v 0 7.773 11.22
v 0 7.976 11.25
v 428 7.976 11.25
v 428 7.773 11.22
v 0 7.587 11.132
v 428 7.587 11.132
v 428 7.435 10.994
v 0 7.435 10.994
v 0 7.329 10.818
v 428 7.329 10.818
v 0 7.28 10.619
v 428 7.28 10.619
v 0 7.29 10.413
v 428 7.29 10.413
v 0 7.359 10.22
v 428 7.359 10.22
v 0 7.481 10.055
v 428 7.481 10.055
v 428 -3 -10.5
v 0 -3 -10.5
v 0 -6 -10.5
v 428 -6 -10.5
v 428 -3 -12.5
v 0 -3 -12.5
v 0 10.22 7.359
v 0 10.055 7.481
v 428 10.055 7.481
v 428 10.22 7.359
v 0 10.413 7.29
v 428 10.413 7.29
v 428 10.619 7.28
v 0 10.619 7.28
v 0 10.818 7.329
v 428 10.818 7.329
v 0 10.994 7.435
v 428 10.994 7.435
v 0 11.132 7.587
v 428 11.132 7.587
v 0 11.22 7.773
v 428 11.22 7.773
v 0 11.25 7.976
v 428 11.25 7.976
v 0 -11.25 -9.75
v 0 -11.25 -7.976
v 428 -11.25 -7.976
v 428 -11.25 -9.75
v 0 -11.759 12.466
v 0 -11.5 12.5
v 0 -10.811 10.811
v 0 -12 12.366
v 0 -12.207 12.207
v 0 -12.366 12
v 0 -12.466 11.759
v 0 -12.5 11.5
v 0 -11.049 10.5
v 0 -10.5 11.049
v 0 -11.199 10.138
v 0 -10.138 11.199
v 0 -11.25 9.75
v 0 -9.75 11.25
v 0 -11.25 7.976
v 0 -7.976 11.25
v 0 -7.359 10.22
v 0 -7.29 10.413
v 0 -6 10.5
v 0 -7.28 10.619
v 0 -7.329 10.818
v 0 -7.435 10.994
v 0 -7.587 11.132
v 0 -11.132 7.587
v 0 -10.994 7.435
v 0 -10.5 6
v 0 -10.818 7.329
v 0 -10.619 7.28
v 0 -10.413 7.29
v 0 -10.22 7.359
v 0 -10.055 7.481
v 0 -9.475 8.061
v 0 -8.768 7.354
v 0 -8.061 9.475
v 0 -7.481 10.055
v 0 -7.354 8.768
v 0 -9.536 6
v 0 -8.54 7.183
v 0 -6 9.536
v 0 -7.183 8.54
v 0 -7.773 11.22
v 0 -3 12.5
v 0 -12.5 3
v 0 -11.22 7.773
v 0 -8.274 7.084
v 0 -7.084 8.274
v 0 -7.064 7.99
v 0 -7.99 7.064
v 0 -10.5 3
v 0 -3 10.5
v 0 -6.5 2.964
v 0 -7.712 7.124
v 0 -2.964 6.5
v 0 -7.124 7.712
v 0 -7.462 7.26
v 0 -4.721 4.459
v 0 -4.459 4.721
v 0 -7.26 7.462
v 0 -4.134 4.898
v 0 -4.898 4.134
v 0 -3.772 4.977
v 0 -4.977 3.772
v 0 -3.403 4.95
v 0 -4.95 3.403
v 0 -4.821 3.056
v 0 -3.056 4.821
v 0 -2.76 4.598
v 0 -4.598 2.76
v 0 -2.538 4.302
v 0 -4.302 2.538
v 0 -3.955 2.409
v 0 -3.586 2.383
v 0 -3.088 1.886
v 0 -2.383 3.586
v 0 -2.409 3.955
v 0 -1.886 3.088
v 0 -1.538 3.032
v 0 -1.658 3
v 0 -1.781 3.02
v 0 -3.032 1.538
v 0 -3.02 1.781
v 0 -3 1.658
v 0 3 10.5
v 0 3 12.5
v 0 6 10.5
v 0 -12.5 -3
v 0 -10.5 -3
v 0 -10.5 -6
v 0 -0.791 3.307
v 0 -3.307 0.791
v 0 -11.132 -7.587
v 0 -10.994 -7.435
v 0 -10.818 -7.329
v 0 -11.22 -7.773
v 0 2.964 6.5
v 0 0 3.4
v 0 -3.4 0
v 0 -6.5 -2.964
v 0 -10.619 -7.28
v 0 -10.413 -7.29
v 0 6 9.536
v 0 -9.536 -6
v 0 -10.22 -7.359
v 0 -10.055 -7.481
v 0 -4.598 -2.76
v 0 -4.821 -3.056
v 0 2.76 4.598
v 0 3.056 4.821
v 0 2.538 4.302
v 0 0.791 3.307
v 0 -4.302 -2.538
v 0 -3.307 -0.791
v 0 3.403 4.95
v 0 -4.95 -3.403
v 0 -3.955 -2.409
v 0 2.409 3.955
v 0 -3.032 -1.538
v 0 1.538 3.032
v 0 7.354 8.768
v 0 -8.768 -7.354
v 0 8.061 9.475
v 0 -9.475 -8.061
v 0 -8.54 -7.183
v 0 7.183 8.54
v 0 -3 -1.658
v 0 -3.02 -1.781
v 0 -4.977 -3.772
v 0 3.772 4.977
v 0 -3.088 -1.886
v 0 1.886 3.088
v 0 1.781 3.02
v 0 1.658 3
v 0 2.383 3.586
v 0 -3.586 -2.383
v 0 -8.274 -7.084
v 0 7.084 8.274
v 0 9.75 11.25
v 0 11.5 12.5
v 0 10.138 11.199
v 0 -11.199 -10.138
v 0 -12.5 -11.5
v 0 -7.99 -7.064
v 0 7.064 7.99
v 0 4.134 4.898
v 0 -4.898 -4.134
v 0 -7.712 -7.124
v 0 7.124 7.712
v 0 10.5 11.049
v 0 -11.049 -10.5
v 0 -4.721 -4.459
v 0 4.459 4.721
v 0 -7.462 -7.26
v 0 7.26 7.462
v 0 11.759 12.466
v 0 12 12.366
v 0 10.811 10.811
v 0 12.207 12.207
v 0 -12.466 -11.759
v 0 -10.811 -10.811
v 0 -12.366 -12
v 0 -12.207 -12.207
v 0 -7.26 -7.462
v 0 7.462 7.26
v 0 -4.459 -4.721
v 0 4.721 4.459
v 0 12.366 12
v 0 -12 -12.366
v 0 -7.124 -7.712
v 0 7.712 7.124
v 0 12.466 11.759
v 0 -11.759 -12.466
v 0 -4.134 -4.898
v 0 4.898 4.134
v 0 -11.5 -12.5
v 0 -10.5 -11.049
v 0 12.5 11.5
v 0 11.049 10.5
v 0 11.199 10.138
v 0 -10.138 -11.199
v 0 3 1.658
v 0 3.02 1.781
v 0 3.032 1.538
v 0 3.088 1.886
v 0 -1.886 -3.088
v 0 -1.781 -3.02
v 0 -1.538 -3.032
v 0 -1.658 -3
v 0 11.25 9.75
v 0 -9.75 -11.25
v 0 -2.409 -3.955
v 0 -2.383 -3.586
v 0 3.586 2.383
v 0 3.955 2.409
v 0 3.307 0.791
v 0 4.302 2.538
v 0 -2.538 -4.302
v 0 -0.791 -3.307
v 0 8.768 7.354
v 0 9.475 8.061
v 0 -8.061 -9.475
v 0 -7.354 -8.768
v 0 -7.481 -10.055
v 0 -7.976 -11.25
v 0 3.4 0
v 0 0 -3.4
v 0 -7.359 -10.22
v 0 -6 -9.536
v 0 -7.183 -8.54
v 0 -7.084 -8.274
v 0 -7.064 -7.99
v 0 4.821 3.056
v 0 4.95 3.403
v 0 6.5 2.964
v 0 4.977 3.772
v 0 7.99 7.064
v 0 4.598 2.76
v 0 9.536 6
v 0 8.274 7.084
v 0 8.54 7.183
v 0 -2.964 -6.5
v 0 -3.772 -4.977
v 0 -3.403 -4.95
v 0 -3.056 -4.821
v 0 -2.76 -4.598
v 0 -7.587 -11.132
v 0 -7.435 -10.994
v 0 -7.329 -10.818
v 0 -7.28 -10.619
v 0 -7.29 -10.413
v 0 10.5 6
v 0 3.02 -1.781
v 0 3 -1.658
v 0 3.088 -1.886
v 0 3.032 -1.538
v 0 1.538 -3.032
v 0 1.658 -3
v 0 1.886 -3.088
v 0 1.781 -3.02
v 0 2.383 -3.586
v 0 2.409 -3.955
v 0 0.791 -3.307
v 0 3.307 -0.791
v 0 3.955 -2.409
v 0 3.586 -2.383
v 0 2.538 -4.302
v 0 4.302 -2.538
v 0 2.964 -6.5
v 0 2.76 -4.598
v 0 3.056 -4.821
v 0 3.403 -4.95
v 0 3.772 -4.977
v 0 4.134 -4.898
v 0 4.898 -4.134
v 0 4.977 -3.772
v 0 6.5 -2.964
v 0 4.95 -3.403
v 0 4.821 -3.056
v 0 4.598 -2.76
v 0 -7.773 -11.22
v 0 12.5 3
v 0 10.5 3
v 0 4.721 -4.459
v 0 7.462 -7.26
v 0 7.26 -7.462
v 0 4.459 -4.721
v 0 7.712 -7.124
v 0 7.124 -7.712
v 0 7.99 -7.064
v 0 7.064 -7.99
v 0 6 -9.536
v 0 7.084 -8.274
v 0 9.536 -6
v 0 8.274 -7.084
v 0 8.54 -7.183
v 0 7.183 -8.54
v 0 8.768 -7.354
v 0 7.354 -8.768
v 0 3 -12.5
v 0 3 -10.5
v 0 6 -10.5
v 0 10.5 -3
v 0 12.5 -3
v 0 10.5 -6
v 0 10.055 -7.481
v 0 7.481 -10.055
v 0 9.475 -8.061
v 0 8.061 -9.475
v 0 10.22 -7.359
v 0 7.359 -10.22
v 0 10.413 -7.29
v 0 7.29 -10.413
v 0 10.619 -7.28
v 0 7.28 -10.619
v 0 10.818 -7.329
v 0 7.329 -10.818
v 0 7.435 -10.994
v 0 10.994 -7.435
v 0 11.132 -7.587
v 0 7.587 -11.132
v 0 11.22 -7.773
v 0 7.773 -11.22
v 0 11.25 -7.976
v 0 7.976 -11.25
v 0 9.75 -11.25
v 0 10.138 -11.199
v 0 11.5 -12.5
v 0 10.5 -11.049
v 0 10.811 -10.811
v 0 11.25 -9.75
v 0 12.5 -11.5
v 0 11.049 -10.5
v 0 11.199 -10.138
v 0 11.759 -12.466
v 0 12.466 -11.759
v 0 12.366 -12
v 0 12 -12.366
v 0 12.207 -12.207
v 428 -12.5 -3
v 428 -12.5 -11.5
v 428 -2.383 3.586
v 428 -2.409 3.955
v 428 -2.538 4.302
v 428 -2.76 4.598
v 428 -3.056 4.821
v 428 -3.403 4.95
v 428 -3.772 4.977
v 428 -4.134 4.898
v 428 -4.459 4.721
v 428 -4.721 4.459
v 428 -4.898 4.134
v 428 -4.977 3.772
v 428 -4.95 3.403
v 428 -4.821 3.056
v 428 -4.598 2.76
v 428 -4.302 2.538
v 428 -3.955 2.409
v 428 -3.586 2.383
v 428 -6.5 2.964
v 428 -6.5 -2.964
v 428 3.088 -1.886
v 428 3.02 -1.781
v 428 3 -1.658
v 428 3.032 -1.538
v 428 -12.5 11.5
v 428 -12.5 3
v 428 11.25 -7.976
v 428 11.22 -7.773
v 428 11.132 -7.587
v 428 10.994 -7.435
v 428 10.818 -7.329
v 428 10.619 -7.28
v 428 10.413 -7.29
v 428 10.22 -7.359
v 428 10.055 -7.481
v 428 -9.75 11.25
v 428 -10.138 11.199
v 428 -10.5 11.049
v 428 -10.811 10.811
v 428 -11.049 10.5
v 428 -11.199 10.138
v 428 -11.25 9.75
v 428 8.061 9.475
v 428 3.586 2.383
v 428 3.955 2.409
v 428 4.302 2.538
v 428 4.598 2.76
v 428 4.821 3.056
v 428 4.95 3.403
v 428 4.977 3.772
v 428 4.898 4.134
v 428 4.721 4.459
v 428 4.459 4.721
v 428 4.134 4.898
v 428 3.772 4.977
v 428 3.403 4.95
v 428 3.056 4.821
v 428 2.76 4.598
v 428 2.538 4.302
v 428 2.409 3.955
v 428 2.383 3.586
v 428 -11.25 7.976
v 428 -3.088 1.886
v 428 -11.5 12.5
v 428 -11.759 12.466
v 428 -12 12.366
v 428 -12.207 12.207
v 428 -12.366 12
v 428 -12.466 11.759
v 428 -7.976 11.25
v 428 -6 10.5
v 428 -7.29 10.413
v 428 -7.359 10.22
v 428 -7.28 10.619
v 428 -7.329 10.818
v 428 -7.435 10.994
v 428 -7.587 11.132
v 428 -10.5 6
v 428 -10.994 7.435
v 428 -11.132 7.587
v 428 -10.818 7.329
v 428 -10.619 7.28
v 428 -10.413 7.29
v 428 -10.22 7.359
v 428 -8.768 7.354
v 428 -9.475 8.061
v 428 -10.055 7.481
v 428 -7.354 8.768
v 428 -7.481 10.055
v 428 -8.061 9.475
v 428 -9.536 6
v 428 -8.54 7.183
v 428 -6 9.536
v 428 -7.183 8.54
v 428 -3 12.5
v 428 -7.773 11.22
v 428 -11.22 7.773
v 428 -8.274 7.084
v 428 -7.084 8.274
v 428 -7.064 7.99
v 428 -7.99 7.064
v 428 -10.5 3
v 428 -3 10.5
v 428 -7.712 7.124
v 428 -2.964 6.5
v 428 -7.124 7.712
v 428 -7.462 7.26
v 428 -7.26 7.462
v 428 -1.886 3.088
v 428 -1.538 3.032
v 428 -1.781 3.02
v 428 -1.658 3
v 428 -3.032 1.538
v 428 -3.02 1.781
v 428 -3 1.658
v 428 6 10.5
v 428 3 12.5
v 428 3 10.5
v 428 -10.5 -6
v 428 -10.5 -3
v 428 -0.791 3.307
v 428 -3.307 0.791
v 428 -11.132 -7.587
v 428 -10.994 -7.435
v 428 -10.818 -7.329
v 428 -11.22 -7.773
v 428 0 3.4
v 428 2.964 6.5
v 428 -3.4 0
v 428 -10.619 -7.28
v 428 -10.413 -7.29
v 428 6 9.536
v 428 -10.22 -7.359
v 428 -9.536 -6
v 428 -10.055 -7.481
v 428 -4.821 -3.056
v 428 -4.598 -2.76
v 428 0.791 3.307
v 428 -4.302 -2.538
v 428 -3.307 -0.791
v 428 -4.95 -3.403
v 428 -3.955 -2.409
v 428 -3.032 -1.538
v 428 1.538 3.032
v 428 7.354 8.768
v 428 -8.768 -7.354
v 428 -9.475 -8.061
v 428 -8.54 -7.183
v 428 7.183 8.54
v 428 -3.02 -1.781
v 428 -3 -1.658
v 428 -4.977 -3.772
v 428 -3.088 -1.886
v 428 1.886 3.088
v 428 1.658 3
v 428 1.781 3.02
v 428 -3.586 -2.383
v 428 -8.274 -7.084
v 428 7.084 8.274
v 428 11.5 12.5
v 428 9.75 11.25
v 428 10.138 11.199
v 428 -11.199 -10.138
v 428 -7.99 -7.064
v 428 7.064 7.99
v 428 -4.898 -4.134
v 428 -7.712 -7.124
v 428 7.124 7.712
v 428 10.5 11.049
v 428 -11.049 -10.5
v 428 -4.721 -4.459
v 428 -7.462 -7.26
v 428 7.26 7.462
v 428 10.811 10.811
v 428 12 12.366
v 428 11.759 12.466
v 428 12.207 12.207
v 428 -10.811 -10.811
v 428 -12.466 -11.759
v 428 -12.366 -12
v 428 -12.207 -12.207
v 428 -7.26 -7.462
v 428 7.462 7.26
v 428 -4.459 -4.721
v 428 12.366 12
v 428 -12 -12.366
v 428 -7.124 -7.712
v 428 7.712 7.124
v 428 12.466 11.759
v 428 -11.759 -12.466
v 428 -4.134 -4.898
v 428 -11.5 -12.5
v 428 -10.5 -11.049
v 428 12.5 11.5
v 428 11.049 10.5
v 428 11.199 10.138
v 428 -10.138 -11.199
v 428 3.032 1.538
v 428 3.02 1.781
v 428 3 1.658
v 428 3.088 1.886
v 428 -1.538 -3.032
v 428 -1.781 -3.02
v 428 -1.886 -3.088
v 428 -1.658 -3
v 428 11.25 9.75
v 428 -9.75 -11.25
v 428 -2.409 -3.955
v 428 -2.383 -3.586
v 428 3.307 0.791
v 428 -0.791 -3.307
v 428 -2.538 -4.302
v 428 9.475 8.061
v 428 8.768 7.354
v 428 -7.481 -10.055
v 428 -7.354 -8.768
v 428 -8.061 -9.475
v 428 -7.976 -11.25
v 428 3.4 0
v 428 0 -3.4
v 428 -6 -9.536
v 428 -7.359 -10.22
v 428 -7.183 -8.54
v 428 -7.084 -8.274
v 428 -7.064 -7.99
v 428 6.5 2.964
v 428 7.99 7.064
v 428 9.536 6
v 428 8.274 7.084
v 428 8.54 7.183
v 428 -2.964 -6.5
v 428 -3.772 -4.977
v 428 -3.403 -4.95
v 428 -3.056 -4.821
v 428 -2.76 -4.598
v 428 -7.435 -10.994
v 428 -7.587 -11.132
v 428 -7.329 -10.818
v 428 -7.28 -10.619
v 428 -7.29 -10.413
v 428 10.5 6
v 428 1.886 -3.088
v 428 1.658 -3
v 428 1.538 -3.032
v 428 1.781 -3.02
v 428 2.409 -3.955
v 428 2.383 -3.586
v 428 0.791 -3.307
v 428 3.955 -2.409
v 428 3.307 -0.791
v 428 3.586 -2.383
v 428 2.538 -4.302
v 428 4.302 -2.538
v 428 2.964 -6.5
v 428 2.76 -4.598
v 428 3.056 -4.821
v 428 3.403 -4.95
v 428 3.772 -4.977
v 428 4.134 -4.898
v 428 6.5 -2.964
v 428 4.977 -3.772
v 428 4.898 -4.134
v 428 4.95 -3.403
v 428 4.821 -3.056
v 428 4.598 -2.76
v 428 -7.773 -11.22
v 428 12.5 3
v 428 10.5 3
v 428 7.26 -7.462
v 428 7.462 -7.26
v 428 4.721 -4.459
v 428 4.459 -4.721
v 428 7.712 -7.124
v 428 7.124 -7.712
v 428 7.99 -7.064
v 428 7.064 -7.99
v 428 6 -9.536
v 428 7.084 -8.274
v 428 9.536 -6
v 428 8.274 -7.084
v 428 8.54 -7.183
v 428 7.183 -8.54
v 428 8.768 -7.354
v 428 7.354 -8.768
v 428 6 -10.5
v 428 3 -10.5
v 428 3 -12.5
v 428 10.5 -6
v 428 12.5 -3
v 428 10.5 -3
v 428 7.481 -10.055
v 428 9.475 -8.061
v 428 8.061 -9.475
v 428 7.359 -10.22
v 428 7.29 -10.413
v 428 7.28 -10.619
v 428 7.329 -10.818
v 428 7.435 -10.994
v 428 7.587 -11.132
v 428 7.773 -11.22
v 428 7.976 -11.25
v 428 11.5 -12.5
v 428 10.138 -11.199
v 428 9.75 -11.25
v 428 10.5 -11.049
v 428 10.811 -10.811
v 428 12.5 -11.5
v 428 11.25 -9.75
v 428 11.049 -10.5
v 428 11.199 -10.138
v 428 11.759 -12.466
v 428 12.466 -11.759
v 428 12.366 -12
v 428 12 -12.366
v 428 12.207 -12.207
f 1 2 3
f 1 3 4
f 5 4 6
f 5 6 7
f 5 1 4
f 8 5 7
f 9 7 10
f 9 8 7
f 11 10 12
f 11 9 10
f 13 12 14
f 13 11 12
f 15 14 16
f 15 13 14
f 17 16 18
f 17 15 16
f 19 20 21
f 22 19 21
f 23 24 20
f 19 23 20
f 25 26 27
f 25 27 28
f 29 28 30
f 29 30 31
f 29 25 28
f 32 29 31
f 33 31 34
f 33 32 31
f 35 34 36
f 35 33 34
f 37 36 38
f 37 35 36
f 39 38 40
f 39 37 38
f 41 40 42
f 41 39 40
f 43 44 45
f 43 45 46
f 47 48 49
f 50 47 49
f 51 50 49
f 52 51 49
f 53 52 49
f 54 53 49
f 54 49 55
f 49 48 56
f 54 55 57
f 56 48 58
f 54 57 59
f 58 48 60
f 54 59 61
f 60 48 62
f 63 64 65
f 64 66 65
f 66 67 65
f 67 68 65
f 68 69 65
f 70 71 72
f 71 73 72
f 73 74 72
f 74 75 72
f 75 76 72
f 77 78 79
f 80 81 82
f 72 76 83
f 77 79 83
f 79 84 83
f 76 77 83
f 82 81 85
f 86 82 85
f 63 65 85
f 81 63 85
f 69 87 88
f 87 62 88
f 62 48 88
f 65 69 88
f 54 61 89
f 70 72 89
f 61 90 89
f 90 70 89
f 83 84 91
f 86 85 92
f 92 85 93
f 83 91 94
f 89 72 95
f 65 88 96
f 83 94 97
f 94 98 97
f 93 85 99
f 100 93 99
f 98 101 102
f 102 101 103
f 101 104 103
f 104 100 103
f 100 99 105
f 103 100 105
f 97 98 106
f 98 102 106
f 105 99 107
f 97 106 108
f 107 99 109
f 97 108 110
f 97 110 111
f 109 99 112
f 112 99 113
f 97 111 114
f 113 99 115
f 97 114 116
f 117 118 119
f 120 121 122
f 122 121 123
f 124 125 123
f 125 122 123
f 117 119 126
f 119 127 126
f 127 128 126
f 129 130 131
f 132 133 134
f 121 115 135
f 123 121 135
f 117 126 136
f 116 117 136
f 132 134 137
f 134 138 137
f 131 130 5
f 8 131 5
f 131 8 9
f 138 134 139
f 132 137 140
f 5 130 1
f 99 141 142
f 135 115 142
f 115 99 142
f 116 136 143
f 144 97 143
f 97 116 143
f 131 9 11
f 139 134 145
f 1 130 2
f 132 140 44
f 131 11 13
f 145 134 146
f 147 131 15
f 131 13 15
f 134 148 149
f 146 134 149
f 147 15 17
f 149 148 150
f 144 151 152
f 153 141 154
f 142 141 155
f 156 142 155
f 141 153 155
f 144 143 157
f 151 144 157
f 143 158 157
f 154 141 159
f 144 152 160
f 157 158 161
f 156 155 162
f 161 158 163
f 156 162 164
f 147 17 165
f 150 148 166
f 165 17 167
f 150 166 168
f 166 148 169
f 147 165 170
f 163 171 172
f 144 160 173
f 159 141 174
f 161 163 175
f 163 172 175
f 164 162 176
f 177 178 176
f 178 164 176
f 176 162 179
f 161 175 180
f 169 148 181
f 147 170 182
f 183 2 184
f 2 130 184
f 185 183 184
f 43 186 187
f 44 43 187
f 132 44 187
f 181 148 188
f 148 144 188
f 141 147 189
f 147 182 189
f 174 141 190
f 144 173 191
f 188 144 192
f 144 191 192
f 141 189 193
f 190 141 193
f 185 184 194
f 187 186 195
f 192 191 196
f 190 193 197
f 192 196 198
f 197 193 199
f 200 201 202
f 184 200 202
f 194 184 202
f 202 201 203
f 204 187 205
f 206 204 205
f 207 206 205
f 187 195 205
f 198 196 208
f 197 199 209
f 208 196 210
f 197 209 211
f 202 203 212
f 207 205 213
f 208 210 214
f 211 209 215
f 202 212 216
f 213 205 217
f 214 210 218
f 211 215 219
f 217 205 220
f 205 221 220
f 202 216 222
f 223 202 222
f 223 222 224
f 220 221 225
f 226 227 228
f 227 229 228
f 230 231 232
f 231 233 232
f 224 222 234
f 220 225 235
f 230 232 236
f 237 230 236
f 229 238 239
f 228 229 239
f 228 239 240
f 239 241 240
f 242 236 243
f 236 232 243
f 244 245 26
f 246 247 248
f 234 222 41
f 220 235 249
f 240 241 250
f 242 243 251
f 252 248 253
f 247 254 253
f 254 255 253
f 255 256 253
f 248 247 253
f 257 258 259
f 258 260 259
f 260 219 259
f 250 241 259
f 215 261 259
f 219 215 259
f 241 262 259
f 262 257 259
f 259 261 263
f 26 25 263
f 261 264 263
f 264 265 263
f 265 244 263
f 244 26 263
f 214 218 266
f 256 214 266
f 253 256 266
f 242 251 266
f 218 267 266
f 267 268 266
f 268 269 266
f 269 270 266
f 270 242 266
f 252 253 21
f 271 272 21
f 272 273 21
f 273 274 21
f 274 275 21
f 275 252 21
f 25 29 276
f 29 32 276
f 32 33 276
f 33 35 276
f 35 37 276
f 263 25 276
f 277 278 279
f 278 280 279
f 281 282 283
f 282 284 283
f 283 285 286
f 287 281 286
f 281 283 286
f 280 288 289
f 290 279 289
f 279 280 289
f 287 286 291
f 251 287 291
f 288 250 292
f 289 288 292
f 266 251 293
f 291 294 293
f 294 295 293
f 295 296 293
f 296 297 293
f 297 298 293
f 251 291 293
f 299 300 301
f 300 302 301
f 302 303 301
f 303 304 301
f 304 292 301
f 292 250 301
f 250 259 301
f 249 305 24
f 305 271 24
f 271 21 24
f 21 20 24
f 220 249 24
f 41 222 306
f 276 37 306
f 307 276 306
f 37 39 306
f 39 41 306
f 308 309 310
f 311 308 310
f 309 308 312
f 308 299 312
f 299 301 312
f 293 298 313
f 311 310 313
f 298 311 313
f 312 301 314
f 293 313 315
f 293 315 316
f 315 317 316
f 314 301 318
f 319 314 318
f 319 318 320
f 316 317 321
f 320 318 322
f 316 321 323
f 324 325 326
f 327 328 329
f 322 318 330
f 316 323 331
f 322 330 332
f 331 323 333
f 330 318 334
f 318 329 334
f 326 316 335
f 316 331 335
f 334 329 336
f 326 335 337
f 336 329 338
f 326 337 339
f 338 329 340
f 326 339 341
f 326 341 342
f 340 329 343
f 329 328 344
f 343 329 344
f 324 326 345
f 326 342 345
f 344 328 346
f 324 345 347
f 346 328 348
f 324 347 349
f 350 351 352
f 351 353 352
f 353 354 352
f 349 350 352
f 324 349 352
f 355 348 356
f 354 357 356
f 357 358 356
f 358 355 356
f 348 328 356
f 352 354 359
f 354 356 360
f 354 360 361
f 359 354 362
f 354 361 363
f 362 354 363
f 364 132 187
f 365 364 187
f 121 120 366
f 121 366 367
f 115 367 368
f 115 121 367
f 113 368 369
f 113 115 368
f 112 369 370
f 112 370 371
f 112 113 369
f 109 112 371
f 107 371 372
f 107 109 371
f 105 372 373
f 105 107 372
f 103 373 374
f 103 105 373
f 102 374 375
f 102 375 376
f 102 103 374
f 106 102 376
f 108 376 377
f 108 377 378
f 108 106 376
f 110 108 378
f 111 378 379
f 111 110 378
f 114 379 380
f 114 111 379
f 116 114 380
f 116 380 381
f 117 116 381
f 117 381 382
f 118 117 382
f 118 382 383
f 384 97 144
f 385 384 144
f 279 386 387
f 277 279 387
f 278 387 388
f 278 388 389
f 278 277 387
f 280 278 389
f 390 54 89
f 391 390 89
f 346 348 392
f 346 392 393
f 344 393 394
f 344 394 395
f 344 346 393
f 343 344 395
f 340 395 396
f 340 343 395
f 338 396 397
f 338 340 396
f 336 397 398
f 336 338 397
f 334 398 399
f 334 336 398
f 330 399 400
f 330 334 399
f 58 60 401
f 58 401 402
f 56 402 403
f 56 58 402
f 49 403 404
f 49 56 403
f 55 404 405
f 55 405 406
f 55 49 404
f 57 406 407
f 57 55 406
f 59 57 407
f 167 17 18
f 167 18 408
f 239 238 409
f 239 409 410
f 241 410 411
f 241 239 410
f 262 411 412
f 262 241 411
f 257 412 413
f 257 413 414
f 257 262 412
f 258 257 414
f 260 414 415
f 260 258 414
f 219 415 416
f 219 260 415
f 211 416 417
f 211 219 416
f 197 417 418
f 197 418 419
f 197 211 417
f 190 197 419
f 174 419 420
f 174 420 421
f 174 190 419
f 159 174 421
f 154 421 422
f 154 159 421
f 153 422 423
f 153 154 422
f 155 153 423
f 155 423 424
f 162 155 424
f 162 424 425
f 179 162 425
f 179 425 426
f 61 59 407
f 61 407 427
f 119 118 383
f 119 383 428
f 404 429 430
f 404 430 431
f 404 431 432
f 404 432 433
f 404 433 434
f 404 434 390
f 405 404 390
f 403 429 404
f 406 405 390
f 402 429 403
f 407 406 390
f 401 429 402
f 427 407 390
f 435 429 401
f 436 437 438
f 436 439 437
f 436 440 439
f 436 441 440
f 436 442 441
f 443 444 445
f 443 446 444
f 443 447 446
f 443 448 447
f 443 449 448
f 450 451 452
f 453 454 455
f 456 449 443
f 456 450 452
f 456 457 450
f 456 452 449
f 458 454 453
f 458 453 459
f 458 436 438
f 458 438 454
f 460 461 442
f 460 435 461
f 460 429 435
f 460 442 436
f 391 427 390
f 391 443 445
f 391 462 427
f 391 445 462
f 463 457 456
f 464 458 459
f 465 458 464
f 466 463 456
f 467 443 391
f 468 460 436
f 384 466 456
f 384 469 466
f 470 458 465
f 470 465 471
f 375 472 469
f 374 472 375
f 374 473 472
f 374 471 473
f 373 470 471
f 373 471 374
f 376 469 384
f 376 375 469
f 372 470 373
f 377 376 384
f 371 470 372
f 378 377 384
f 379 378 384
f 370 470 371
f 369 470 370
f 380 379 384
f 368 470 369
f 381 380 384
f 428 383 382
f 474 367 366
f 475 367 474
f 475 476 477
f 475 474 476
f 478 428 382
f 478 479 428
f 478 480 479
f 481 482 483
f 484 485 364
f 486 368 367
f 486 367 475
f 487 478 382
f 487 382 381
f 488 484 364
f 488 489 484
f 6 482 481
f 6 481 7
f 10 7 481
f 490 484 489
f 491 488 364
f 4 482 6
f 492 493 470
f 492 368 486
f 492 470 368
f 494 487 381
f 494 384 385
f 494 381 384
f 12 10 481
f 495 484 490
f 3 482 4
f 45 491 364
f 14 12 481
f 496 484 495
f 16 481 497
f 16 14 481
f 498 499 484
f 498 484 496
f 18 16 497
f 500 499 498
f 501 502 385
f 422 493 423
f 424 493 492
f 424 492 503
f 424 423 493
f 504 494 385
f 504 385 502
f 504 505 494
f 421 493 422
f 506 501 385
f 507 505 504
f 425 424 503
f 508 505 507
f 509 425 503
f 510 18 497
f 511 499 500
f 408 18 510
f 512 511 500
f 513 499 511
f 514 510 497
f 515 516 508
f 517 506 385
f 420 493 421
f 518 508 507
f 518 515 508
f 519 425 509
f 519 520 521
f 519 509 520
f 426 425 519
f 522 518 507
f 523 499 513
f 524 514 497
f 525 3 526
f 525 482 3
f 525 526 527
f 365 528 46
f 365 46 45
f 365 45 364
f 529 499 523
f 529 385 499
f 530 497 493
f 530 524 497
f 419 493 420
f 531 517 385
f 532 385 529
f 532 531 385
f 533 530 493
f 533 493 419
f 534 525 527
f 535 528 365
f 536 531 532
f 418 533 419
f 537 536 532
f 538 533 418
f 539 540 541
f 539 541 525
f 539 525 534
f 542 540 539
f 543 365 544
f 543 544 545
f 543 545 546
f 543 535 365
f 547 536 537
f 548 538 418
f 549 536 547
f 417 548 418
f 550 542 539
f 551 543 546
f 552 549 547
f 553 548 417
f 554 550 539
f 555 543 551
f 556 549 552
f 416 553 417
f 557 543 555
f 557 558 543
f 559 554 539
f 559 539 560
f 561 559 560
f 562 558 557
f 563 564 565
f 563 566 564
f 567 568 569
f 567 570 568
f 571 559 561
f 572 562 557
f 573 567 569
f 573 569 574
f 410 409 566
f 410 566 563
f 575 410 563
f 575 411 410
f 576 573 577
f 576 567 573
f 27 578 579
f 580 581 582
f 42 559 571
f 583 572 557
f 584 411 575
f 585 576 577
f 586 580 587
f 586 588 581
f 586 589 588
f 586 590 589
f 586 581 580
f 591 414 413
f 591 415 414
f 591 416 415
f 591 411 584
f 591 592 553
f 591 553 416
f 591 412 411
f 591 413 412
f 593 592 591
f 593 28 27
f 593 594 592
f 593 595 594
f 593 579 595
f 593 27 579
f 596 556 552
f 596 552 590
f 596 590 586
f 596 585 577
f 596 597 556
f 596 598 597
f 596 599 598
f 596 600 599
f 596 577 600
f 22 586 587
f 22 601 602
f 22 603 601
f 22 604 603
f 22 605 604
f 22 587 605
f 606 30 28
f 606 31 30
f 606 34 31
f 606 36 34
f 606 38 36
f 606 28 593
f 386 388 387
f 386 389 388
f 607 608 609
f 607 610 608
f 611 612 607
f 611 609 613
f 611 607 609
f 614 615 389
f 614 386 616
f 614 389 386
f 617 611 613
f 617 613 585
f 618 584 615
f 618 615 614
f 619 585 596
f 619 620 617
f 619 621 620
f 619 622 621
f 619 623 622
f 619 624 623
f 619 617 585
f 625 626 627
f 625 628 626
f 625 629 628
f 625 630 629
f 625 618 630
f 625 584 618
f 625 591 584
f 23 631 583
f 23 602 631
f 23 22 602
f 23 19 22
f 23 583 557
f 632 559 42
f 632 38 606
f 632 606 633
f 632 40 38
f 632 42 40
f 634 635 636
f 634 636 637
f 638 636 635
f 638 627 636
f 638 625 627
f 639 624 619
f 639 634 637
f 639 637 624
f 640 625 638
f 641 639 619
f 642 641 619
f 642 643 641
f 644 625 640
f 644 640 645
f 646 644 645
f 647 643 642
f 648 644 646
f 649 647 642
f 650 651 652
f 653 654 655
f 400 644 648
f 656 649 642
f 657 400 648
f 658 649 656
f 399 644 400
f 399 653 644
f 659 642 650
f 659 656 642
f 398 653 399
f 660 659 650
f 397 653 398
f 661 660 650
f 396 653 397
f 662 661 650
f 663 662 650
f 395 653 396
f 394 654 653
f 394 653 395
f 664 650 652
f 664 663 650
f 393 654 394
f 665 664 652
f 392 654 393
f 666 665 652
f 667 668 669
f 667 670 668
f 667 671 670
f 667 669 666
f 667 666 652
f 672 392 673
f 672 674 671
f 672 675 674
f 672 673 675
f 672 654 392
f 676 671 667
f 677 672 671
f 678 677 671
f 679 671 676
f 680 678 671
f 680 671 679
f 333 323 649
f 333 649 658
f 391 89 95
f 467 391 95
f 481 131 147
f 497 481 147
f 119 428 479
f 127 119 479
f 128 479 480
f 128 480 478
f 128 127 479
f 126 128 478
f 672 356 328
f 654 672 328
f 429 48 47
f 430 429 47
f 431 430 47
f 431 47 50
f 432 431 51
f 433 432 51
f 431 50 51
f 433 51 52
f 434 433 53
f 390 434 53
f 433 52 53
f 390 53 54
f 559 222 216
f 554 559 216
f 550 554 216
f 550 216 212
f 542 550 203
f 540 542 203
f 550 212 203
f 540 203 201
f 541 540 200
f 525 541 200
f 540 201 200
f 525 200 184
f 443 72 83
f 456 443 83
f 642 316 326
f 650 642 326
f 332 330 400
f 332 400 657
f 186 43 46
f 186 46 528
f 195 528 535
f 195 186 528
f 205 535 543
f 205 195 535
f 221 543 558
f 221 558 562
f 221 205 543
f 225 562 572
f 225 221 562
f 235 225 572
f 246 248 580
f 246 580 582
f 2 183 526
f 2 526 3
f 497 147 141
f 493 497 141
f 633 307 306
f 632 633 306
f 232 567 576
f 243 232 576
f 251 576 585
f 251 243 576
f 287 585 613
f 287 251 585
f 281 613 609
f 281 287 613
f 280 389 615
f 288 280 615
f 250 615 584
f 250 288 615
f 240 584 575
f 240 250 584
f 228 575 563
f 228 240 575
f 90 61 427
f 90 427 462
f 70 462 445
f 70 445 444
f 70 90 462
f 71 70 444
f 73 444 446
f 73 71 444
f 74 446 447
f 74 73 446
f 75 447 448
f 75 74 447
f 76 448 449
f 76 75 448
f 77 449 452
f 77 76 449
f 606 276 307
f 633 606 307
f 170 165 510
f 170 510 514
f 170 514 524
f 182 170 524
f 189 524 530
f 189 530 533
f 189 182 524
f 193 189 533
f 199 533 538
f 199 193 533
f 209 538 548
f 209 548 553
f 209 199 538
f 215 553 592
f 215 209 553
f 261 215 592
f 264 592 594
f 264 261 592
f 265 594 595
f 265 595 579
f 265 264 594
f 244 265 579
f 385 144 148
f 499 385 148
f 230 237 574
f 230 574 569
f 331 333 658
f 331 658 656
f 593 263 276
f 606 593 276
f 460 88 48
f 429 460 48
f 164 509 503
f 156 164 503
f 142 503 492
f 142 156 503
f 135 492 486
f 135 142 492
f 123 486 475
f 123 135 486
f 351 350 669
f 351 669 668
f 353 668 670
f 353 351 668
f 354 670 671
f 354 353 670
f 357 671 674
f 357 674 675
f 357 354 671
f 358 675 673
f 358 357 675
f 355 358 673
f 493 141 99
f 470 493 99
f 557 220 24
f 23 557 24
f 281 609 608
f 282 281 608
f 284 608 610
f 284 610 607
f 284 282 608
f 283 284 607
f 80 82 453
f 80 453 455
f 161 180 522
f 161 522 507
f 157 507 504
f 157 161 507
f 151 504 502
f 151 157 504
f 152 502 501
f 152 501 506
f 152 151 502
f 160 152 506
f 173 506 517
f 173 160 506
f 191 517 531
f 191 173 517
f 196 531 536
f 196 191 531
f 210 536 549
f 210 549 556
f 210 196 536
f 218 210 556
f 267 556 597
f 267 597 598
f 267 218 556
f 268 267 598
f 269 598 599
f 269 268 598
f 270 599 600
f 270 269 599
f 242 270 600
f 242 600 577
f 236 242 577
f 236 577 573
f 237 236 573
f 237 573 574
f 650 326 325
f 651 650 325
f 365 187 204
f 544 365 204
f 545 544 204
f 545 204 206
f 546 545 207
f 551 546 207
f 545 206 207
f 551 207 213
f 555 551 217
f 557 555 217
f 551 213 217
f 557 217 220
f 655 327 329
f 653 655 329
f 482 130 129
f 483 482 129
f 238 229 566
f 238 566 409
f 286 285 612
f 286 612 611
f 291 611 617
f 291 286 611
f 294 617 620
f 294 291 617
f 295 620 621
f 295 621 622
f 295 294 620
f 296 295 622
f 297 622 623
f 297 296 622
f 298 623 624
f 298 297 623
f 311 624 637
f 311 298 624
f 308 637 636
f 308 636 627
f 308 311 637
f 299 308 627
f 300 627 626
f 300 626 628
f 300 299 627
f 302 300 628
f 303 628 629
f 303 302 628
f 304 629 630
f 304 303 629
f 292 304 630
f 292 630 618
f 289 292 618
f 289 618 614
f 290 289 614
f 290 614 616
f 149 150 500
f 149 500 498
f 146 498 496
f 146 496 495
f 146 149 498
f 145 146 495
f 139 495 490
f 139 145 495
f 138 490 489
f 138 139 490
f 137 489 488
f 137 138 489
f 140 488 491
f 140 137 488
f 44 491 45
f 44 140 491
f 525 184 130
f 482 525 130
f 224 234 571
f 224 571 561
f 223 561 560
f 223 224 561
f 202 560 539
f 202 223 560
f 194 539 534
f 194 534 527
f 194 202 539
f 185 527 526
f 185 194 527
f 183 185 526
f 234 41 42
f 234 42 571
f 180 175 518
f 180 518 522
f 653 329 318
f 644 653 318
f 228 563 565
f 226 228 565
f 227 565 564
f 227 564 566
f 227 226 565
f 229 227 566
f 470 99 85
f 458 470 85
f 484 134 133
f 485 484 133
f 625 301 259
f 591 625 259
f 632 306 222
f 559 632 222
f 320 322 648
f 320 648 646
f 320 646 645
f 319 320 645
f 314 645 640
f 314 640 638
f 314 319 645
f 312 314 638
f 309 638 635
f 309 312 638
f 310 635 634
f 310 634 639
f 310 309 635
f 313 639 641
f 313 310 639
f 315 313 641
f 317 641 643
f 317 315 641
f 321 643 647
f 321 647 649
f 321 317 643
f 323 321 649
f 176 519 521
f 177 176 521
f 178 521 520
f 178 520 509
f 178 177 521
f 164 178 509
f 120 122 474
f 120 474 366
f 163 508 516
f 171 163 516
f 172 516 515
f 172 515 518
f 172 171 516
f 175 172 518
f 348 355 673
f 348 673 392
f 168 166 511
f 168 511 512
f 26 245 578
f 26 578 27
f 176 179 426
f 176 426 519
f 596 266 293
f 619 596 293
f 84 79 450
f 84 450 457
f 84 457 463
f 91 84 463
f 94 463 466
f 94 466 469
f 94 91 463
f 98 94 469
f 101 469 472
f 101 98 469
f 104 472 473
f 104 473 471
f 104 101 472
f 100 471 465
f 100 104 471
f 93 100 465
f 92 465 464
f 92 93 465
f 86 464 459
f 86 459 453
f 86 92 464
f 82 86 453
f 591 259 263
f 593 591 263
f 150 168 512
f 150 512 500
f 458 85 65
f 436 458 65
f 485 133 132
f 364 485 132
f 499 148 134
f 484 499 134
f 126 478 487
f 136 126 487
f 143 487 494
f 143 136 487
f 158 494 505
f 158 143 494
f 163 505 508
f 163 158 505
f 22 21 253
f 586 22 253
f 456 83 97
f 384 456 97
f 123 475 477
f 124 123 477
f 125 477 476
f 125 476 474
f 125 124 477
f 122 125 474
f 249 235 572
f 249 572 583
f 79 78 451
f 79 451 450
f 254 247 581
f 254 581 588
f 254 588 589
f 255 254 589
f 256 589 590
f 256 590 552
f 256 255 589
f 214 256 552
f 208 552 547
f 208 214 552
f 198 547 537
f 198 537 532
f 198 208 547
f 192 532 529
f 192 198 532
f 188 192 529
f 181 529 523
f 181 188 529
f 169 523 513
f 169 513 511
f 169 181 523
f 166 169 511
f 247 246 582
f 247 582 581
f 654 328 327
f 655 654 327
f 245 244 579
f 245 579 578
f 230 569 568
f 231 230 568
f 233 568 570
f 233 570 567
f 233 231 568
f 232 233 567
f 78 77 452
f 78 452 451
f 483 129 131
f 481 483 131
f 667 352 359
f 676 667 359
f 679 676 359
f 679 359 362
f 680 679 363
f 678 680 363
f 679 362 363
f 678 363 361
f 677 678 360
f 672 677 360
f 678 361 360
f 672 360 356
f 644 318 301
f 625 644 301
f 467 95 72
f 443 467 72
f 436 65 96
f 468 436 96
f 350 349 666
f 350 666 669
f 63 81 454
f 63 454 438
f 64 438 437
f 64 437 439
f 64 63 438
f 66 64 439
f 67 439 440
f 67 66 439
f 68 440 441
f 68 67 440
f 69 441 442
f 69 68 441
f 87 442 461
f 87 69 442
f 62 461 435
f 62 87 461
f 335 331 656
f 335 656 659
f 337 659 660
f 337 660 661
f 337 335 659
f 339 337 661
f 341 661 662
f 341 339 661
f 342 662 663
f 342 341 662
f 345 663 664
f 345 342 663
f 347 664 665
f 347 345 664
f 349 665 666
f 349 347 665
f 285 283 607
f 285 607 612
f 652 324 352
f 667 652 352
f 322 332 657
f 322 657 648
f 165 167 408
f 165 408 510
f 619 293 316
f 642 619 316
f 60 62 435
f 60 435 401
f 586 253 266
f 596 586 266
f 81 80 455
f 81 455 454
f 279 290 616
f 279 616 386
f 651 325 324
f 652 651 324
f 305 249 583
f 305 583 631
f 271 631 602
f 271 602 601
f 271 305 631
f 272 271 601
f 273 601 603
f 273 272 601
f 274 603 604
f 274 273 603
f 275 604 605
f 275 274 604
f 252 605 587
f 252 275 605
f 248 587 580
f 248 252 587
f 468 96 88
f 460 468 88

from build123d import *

# Parameters (mm, degrees)
BOSS_EXTRUDE1_DEPTH = 428


with BuildPart() as part:
    # Sketch1 → Boss-Extrude1 (new body)
    with BuildSketch(Plane(origin=(0, 0, 0), x_dir=(0, 0, -1), z_dir=(1, 0, 0))):
        with BuildLine():
            Line((-12.5, 11.5), (-12.5, 3))
            Line((-12.5, 3), (-10.5, 3))
            Line((-10.5, 3), (-10.5, 6))
            Line((-10.5, 6), (-9.535533906, 6))
            Line((-9.535533906, 6), (-6.5, 2.964466094))
            Line((-6.5, 2.964466094), (-6.5, -2.964466094))
            Line((-6.5, -2.964466094), (-9.535533906, -6))
            Line((-9.535533906, -6), (-10.5, -6))
            Line((-10.5, -6), (-10.5, -3))
            Line((-10.5, -3), (-12.5, -3))
            Line((-12.5, -3), (-12.5, -11.5))
            ThreePointArc((-12.5, -11.5), (-12.207106781, -12.207106781), (-11.5, -12.5))
            Line((-11.5, -12.5), (-3, -12.5))
            Line((-3, -12.5), (-3, -10.5))
            Line((-3, -10.5), (-6, -10.5))
            Line((-6, -10.5), (-6, -9.535533906))
            Line((-6, -9.535533906), (-2.964466094, -6.5))
            Line((-2.964466094, -6.5), (2.964466094, -6.5))
            Line((2.964466094, -6.5), (6, -9.535533906))
            Line((6, -9.535533906), (6, -10.5))
            Line((6, -10.5), (3, -10.5))
            Line((3, -10.5), (3, -12.5))
            Line((3, -12.5), (11.5, -12.5))
            ThreePointArc((11.5, -12.5), (12.207106781, -12.207106781), (12.5, -11.5))
            Line((12.5, -11.5), (12.5, -3))
            Line((12.5, -3), (10.5, -3))
            Line((10.5, -3), (10.5, -6))
            Line((10.5, -6), (9.535533906, -6))
            Line((9.535533906, -6), (6.5, -2.964466094))
            Line((6.5, -2.964466094), (6.5, 2.964466094))
            Line((6.5, 2.964466094), (9.535533906, 6))
            Line((9.535533906, 6), (10.5, 6))
            Line((10.5, 6), (10.5, 3))
            Line((10.5, 3), (12.5, 3))
            Line((12.5, 3), (12.5, 11.5))
            ThreePointArc((12.5, 11.5), (12.207106781, 12.207106781), (11.5, 12.5))
            Line((11.5, 12.5), (3, 12.5))
            Line((3, 12.5), (3, 10.5))
            Line((3, 10.5), (6, 10.5))
            Line((6, 10.5), (6, 9.535533906))
            Line((6, 9.535533906), (2.964466094, 6.5))
            Line((2.964466094, 6.5), (-2.964466094, 6.5))
            Line((-2.964466094, 6.5), (-6, 9.535533906))
            Line((-6, 9.535533906), (-6, 10.5))
            Line((-6, 10.5), (-3, 10.5))
            Line((-3, 10.5), (-3, 12.5))
            Line((-3, 12.5), (-11.5, 12.5))
            ThreePointArc((-11.5, 12.5), (-12.207106781, 12.207106781), (-12.5, 11.5))
        make_face()
        with BuildLine():
            Line((-3.087755464, -1.885673936), (-3.585519377, -2.383437849))
            ThreePointArc((-3.585519377, -2.383437849), (-4.599238816, -4.599238816), (-2.383437849, -3.585519377))
            Line((-2.383437849, -3.585519377), (-1.885673936, -3.087755464))
            ThreePointArc((-1.885673936, -3.087755464), (-1.720751743, -3.0036254), (-1.537849315, -3.032329053))
            ThreePointArc((-1.537849315, -3.032329053), (0, -3.4), (1.537849315, -3.032329053))
            ThreePointArc((1.537849315, -3.032329053), (1.720751743, -3.0036254), (1.885673936, -3.087755464))
            Line((1.885673936, -3.087755464), (2.383437849, -3.585519377))
            ThreePointArc((2.383437849, -3.585519377), (4.599238816, -4.599238816), (3.585519377, -2.383437849))
            Line((3.585519377, -2.383437849), (3.087755464, -1.885673936))
            ThreePointArc((3.087755464, -1.885673936), (3.0036254, -1.720751743), (3.032329053, -1.537849315))
            ThreePointArc((3.032329053, -1.537849315), (3.4, 0), (3.032329053, 1.537849315))
            ThreePointArc((3.032329053, 1.537849315), (3.0036254, 1.720751743), (3.087755464, 1.885673936))
            Line((3.087755464, 1.885673936), (3.585519377, 2.383437849))
            ThreePointArc((3.585519377, 2.383437849), (4.599238816, 4.599238816), (2.383437849, 3.585519377))
            Line((2.383437849, 3.585519377), (1.885673936, 3.087755464))
            ThreePointArc((1.885673936, 3.087755464), (1.720751743, 3.0036254), (1.537849315, 3.032329053))
            ThreePointArc((1.537849315, 3.032329053), (0, 3.4), (-1.537849315, 3.032329053))
            ThreePointArc((-1.537849315, 3.032329053), (-1.720751743, 3.0036254), (-1.885673936, 3.087755464))
            Line((-1.885673936, 3.087755464), (-2.383437849, 3.585519377))
            ThreePointArc((-2.383437849, 3.585519377), (-4.599238816, 4.599238816), (-3.585519377, 2.383437849))
            Line((-3.585519377, 2.383437849), (-3.087755464, 1.885673936))
            ThreePointArc((-3.087755464, 1.885673936), (-3.0036254, 1.720751743), (-3.032329053, 1.537849315))
            ThreePointArc((-3.032329053, 1.537849315), (-3.4, 0), (-3.032329053, -1.537849315))
            ThreePointArc((-3.032329053, -1.537849315), (-3.0036254, -1.720751743), (-3.087755464, -1.885673936))
        make_face(mode=Mode.SUBTRACT)
        with BuildLine():
            Line((-11.25, 9.75), (-11.25, 7.976197667))
            ThreePointArc((-11.25, 7.976197667), (-10.817878403, 7.329481994), (-10.055025253, 7.48122292))
            Line((-10.055025253, 7.48122292), (-9.475230868, 8.061017306))
            Line((-9.475230868, 8.061017306), (-8.768124087, 7.353910524))
            ThreePointArc((-8.768124087, 7.353910524), (-7.353910524, 7.353910524), (-7.353910524, 8.768124087))
            Line((-7.353910524, 8.768124087), (-8.061017306, 9.475230868))
            Line((-8.061017306, 9.475230868), (-7.48122292, 10.055025253))
            ThreePointArc((-7.48122292, 10.055025253), (-7.329481994, 10.817878403), (-7.976197667, 11.25))
            Line((-7.976197667, 11.25), (-9.75, 11.25))
            ThreePointArc((-9.75, 11.25), (-10.810660172, 10.810660172), (-11.25, 9.75))
        make_face(mode=Mode.SUBTRACT)
        with BuildLine():
            Line((8.061017306, 9.475230868), (7.353910524, 8.768124087))
            ThreePointArc((7.353910524, 8.768124087), (7.353910524, 7.353910524), (8.768124087, 7.353910524))
            Line((8.768124087, 7.353910524), (9.475230868, 8.061017306))
            Line((9.475230868, 8.061017306), (10.055025253, 7.48122292))
            ThreePointArc((10.055025253, 7.48122292), (10.817878403, 7.329481994), (11.25, 7.976197667))
            Line((11.25, 7.976197667), (11.25, 9.75))
            ThreePointArc((11.25, 9.75), (10.810660172, 10.810660172), (9.75, 11.25))
            Line((9.75, 11.25), (7.976197667, 11.25))
            ThreePointArc((7.976197667, 11.25), (7.329481994, 10.817878403), (7.48122292, 10.055025253))
            Line((7.48122292, 10.055025253), (8.061017306, 9.475230868))
        make_face(mode=Mode.SUBTRACT)
        with BuildLine():
            Line((-9.475230868, -8.061017306), (-10.055025253, -7.48122292))
            ThreePointArc((-10.055025253, -7.48122292), (-10.817878403, -7.329481994), (-11.25, -7.976197667))
            Line((-11.25, -7.976197667), (-11.25, -9.75))
            ThreePointArc((-11.25, -9.75), (-10.810660172, -10.810660172), (-9.75, -11.25))
            Line((-9.75, -11.25), (-7.976197667, -11.25))
            ThreePointArc((-7.976197667, -11.25), (-7.329481994, -10.817878403), (-7.48122292, -10.055025253))
            Line((-7.48122292, -10.055025253), (-8.061017306, -9.475230868))
            Line((-8.061017306, -9.475230868), (-7.353910524, -8.768124087))
            ThreePointArc((-7.353910524, -8.768124087), (-7.353910524, -7.353910524), (-8.768124087, -7.353910524))
            Line((-8.768124087, -7.353910524), (-9.475230868, -8.061017306))
        make_face(mode=Mode.SUBTRACT)
        with BuildLine():
            Line((9.475230868, -8.061017306), (8.768124087, -7.353910524))
            ThreePointArc((8.768124087, -7.353910524), (7.353910524, -7.353910524), (7.353910524, -8.768124087))
            Line((7.353910524, -8.768124087), (8.061017306, -9.475230868))
            Line((8.061017306, -9.475230868), (7.48122292, -10.055025253))
            ThreePointArc((7.48122292, -10.055025253), (7.329481994, -10.817878403), (7.976197667, -11.25))
            Line((7.976197667, -11.25), (9.75, -11.25))
            ThreePointArc((9.75, -11.25), (10.810660172, -10.810660172), (11.25, -9.75))
            Line((11.25, -9.75), (11.25, -7.976197667))
            ThreePointArc((11.25, -7.976197667), (10.817878403, -7.329481994), (10.055025253, -7.48122292))
            Line((10.055025253, -7.48122292), (9.475230868, -8.061017306))
        make_face(mode=Mode.SUBTRACT)
    extrude(amount=BOSS_EXTRUDE1_DEPTH)


solid = part.part
